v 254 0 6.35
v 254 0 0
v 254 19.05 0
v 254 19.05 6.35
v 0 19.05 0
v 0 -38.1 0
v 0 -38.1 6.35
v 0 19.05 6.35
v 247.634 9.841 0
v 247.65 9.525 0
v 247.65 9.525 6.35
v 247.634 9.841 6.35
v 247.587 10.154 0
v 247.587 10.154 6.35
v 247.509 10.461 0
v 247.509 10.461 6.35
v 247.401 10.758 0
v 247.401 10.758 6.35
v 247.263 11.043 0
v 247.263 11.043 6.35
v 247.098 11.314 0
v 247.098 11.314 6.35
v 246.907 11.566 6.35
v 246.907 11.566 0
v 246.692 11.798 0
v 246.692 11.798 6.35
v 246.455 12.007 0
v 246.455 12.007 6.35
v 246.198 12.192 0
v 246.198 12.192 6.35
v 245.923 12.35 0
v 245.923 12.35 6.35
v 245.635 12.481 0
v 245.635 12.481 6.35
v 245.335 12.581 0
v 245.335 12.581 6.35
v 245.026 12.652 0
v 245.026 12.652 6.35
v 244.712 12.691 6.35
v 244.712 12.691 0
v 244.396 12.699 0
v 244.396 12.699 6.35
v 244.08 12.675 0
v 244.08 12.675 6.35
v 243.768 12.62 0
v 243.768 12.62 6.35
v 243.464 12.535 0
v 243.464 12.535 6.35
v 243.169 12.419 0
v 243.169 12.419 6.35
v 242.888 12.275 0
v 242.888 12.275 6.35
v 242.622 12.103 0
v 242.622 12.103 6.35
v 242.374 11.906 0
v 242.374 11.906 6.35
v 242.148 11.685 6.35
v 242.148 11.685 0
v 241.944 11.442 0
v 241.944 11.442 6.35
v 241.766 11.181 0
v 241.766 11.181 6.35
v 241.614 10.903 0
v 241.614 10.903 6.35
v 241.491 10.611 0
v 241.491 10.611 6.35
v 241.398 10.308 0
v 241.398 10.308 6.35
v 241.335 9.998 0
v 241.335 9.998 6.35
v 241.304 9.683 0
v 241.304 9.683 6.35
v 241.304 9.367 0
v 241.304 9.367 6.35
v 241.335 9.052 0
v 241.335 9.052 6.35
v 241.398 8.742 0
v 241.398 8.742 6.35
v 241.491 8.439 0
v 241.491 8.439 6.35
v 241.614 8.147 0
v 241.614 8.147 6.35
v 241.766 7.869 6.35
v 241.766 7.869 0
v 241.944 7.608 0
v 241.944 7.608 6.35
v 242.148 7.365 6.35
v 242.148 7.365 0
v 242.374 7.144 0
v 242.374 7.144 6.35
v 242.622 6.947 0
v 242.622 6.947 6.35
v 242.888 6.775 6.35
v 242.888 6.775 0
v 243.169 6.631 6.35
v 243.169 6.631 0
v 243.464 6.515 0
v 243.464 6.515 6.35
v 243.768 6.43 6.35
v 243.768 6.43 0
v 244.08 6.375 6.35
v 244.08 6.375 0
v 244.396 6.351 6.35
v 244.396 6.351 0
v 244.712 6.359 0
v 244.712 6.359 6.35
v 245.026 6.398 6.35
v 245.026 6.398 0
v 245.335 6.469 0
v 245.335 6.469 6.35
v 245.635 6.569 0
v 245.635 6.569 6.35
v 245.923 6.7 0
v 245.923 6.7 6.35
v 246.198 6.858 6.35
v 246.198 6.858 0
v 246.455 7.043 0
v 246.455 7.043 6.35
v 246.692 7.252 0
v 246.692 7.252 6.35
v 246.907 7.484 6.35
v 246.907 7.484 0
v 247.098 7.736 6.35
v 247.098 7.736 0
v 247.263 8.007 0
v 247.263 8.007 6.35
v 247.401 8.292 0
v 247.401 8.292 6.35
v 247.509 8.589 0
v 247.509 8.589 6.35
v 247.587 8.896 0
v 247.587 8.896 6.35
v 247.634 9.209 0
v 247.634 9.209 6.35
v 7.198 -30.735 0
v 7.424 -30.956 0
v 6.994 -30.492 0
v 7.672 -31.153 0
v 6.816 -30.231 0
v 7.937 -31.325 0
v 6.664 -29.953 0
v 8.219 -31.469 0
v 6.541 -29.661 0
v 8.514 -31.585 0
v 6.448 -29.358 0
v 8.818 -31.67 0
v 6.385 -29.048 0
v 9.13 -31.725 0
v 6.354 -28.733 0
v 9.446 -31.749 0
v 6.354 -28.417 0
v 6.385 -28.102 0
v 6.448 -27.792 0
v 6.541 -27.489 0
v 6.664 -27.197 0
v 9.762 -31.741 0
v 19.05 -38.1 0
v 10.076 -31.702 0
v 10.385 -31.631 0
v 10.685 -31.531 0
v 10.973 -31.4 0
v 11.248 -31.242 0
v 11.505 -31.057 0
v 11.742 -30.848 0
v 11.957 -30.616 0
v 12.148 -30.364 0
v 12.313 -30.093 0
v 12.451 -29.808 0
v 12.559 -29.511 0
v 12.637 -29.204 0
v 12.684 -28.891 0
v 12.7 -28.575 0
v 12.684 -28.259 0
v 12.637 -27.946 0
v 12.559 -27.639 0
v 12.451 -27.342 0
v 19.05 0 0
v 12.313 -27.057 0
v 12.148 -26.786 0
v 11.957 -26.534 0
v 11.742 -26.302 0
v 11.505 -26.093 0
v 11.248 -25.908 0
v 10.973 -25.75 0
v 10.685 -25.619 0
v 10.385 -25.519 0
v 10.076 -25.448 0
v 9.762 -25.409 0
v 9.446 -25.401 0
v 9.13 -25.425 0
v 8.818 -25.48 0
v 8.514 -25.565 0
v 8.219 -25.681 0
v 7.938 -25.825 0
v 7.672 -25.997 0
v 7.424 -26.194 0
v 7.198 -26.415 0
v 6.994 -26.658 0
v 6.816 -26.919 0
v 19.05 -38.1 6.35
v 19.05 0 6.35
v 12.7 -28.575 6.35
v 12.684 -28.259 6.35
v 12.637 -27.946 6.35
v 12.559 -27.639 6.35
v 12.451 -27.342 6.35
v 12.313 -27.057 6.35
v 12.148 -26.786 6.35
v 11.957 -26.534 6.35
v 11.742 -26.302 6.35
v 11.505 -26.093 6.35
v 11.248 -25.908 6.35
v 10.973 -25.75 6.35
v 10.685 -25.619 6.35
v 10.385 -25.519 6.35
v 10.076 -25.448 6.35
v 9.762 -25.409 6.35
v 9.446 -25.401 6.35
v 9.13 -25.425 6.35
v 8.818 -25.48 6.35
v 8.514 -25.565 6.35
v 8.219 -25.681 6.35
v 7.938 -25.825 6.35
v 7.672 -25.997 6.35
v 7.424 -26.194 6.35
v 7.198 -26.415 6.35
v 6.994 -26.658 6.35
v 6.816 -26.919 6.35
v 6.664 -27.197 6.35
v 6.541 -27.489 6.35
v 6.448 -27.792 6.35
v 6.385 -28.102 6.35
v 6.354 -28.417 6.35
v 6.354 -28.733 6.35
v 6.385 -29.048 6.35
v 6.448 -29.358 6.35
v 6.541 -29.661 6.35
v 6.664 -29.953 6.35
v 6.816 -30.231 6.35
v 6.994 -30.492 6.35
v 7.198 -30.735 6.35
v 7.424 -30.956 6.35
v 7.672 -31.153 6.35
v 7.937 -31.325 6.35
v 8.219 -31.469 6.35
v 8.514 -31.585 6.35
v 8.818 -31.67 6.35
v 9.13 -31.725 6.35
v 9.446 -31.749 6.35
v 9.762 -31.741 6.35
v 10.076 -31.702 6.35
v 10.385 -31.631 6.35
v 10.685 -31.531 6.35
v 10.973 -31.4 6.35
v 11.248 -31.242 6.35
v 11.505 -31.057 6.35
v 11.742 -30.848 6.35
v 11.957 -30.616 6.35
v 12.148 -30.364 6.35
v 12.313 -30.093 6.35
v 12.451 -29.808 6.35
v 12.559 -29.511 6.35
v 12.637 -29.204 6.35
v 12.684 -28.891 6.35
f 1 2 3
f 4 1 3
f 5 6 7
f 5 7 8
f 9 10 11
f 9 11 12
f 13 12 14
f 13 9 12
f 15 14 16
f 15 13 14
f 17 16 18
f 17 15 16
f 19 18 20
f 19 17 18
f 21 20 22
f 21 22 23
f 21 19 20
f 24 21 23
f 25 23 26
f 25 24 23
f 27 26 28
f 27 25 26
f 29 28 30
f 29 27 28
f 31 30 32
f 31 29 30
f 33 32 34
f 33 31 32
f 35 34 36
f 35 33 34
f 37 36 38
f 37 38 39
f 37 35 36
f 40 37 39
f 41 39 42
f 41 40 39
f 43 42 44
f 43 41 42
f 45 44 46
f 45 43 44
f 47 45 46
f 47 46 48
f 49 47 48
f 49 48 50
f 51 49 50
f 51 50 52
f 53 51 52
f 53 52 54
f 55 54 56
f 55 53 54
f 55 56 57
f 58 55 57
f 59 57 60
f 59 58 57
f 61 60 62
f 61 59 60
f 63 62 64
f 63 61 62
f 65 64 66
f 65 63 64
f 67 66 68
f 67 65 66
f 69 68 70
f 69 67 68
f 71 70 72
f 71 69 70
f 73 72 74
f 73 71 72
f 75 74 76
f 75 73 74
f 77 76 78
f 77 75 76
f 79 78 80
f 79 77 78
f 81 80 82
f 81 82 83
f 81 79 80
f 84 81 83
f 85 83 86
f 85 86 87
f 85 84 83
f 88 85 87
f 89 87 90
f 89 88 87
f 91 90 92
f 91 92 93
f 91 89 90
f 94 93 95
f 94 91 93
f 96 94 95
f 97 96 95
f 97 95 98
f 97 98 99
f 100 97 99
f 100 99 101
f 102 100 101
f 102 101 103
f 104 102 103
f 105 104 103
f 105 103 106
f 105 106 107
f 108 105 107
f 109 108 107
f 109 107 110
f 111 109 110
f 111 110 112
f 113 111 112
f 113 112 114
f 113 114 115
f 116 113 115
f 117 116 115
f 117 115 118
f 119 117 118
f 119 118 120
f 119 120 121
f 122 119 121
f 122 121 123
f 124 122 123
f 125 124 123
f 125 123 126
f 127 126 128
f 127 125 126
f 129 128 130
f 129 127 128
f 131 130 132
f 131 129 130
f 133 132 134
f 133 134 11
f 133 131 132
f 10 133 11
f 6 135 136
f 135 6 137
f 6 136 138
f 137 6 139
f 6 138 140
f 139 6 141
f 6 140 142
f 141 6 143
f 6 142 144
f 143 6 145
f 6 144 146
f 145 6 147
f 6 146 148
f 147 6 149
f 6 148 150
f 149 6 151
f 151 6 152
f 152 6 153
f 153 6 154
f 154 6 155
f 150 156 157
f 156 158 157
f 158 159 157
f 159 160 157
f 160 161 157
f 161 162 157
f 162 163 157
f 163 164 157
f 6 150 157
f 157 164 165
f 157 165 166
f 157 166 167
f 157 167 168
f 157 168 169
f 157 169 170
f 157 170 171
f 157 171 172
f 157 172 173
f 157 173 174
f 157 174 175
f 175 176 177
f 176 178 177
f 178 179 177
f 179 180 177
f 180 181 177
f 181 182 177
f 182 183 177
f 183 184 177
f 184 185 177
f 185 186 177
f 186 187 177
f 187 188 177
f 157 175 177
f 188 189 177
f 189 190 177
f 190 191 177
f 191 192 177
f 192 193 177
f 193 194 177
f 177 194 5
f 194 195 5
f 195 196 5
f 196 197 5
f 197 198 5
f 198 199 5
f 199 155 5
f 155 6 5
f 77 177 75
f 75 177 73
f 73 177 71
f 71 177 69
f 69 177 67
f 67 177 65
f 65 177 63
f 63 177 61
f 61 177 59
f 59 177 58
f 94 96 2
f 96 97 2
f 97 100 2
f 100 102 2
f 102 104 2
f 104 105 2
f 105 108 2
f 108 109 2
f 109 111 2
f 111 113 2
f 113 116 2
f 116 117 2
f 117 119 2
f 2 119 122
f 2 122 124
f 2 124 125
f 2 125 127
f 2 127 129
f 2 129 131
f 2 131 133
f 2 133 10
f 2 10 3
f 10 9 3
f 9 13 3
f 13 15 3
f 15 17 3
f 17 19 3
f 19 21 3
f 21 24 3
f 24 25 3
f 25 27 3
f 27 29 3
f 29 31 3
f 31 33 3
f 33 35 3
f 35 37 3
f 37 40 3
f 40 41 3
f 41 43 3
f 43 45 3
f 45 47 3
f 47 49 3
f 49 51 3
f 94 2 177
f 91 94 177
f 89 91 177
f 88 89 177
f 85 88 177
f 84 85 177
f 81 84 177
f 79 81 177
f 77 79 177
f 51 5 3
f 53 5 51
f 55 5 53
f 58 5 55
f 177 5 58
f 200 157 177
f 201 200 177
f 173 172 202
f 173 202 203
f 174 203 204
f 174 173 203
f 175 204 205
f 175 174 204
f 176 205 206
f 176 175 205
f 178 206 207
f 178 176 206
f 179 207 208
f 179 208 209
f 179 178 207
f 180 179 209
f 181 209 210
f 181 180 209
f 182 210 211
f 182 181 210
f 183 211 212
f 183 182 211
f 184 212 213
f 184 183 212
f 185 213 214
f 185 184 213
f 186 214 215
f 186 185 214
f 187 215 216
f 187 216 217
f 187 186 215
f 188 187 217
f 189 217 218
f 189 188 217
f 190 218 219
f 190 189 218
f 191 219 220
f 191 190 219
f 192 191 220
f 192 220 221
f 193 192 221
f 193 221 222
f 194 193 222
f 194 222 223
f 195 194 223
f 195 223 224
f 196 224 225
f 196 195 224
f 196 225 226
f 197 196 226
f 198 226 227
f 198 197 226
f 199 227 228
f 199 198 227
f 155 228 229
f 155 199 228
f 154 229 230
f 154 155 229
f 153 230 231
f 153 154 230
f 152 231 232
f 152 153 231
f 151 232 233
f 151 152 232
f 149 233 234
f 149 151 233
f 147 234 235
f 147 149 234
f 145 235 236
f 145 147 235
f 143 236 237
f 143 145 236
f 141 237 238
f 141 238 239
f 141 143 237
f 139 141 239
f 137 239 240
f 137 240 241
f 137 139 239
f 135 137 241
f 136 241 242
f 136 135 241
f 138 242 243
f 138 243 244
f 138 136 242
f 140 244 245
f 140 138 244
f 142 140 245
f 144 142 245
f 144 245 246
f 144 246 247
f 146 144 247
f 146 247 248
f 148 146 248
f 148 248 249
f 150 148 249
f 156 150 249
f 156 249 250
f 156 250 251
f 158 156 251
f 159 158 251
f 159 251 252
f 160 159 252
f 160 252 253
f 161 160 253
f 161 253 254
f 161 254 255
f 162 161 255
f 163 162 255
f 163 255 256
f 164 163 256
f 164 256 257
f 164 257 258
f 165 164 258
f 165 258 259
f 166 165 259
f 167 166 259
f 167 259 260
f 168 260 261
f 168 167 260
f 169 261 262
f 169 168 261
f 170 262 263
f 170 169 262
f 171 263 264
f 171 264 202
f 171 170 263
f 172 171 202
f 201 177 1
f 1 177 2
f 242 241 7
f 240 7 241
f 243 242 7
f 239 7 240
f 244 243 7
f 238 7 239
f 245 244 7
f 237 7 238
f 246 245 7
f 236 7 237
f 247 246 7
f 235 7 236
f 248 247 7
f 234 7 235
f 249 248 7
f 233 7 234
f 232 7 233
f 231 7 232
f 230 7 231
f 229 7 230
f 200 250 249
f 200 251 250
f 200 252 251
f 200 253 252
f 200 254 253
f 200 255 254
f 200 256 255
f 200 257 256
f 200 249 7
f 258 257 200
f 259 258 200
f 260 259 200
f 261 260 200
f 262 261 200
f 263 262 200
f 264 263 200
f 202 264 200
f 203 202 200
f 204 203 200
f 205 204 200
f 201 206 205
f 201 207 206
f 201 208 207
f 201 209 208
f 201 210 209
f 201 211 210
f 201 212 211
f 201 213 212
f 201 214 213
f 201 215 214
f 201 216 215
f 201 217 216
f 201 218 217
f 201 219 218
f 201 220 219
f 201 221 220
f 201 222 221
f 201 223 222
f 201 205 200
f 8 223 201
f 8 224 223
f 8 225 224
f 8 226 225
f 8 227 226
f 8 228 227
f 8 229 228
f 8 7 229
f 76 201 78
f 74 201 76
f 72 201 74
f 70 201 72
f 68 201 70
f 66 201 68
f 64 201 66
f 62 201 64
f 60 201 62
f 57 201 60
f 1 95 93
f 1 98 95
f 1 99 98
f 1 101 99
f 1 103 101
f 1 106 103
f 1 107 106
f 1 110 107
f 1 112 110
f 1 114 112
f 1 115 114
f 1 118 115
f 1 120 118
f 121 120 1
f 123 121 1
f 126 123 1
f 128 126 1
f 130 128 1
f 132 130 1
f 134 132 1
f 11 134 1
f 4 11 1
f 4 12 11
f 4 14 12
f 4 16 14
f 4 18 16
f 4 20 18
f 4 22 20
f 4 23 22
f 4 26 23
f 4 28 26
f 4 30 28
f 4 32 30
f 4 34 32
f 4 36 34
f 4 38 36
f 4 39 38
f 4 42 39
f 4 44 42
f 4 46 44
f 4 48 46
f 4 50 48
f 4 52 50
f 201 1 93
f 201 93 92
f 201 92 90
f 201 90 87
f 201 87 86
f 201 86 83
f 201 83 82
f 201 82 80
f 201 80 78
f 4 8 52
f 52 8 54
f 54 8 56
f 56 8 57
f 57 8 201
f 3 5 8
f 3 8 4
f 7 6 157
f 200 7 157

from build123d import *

# Parameters (mm, degrees)
SKETCH1_W           = 254
SKETCH1_H           = 19.05
SKETCH1_R           = 3.175
SKETCH1_W_2         = 19.05
SKETCH1_H_2         = 38.1
BOSS_EXTRUDE1_DEPTH = 6.35


with BuildPart() as part:
    # Sketch1 → Boss-Extrude1 (new body)
    # profile 1 of 2: a face of its own
    with BuildSketch(Plane.XY):
        with Locations((127, 9.525)):
            Rectangle(SKETCH1_W, SKETCH1_H)
        with Locations((244.475, 9.525)):
            Circle(SKETCH1_R, mode=Mode.SUBTRACT)
    # profile 2 of 2: a face of its own
    with BuildSketch(Plane.XY):
        with Locations((9.525, -19.05)):
            Rectangle(SKETCH1_W_2, SKETCH1_H_2)
        with Locations((9.525, -28.575)):
            Circle(SKETCH1_R, mode=Mode.SUBTRACT)
    extrude(amount=BOSS_EXTRUDE1_DEPTH)


solid = part.part
